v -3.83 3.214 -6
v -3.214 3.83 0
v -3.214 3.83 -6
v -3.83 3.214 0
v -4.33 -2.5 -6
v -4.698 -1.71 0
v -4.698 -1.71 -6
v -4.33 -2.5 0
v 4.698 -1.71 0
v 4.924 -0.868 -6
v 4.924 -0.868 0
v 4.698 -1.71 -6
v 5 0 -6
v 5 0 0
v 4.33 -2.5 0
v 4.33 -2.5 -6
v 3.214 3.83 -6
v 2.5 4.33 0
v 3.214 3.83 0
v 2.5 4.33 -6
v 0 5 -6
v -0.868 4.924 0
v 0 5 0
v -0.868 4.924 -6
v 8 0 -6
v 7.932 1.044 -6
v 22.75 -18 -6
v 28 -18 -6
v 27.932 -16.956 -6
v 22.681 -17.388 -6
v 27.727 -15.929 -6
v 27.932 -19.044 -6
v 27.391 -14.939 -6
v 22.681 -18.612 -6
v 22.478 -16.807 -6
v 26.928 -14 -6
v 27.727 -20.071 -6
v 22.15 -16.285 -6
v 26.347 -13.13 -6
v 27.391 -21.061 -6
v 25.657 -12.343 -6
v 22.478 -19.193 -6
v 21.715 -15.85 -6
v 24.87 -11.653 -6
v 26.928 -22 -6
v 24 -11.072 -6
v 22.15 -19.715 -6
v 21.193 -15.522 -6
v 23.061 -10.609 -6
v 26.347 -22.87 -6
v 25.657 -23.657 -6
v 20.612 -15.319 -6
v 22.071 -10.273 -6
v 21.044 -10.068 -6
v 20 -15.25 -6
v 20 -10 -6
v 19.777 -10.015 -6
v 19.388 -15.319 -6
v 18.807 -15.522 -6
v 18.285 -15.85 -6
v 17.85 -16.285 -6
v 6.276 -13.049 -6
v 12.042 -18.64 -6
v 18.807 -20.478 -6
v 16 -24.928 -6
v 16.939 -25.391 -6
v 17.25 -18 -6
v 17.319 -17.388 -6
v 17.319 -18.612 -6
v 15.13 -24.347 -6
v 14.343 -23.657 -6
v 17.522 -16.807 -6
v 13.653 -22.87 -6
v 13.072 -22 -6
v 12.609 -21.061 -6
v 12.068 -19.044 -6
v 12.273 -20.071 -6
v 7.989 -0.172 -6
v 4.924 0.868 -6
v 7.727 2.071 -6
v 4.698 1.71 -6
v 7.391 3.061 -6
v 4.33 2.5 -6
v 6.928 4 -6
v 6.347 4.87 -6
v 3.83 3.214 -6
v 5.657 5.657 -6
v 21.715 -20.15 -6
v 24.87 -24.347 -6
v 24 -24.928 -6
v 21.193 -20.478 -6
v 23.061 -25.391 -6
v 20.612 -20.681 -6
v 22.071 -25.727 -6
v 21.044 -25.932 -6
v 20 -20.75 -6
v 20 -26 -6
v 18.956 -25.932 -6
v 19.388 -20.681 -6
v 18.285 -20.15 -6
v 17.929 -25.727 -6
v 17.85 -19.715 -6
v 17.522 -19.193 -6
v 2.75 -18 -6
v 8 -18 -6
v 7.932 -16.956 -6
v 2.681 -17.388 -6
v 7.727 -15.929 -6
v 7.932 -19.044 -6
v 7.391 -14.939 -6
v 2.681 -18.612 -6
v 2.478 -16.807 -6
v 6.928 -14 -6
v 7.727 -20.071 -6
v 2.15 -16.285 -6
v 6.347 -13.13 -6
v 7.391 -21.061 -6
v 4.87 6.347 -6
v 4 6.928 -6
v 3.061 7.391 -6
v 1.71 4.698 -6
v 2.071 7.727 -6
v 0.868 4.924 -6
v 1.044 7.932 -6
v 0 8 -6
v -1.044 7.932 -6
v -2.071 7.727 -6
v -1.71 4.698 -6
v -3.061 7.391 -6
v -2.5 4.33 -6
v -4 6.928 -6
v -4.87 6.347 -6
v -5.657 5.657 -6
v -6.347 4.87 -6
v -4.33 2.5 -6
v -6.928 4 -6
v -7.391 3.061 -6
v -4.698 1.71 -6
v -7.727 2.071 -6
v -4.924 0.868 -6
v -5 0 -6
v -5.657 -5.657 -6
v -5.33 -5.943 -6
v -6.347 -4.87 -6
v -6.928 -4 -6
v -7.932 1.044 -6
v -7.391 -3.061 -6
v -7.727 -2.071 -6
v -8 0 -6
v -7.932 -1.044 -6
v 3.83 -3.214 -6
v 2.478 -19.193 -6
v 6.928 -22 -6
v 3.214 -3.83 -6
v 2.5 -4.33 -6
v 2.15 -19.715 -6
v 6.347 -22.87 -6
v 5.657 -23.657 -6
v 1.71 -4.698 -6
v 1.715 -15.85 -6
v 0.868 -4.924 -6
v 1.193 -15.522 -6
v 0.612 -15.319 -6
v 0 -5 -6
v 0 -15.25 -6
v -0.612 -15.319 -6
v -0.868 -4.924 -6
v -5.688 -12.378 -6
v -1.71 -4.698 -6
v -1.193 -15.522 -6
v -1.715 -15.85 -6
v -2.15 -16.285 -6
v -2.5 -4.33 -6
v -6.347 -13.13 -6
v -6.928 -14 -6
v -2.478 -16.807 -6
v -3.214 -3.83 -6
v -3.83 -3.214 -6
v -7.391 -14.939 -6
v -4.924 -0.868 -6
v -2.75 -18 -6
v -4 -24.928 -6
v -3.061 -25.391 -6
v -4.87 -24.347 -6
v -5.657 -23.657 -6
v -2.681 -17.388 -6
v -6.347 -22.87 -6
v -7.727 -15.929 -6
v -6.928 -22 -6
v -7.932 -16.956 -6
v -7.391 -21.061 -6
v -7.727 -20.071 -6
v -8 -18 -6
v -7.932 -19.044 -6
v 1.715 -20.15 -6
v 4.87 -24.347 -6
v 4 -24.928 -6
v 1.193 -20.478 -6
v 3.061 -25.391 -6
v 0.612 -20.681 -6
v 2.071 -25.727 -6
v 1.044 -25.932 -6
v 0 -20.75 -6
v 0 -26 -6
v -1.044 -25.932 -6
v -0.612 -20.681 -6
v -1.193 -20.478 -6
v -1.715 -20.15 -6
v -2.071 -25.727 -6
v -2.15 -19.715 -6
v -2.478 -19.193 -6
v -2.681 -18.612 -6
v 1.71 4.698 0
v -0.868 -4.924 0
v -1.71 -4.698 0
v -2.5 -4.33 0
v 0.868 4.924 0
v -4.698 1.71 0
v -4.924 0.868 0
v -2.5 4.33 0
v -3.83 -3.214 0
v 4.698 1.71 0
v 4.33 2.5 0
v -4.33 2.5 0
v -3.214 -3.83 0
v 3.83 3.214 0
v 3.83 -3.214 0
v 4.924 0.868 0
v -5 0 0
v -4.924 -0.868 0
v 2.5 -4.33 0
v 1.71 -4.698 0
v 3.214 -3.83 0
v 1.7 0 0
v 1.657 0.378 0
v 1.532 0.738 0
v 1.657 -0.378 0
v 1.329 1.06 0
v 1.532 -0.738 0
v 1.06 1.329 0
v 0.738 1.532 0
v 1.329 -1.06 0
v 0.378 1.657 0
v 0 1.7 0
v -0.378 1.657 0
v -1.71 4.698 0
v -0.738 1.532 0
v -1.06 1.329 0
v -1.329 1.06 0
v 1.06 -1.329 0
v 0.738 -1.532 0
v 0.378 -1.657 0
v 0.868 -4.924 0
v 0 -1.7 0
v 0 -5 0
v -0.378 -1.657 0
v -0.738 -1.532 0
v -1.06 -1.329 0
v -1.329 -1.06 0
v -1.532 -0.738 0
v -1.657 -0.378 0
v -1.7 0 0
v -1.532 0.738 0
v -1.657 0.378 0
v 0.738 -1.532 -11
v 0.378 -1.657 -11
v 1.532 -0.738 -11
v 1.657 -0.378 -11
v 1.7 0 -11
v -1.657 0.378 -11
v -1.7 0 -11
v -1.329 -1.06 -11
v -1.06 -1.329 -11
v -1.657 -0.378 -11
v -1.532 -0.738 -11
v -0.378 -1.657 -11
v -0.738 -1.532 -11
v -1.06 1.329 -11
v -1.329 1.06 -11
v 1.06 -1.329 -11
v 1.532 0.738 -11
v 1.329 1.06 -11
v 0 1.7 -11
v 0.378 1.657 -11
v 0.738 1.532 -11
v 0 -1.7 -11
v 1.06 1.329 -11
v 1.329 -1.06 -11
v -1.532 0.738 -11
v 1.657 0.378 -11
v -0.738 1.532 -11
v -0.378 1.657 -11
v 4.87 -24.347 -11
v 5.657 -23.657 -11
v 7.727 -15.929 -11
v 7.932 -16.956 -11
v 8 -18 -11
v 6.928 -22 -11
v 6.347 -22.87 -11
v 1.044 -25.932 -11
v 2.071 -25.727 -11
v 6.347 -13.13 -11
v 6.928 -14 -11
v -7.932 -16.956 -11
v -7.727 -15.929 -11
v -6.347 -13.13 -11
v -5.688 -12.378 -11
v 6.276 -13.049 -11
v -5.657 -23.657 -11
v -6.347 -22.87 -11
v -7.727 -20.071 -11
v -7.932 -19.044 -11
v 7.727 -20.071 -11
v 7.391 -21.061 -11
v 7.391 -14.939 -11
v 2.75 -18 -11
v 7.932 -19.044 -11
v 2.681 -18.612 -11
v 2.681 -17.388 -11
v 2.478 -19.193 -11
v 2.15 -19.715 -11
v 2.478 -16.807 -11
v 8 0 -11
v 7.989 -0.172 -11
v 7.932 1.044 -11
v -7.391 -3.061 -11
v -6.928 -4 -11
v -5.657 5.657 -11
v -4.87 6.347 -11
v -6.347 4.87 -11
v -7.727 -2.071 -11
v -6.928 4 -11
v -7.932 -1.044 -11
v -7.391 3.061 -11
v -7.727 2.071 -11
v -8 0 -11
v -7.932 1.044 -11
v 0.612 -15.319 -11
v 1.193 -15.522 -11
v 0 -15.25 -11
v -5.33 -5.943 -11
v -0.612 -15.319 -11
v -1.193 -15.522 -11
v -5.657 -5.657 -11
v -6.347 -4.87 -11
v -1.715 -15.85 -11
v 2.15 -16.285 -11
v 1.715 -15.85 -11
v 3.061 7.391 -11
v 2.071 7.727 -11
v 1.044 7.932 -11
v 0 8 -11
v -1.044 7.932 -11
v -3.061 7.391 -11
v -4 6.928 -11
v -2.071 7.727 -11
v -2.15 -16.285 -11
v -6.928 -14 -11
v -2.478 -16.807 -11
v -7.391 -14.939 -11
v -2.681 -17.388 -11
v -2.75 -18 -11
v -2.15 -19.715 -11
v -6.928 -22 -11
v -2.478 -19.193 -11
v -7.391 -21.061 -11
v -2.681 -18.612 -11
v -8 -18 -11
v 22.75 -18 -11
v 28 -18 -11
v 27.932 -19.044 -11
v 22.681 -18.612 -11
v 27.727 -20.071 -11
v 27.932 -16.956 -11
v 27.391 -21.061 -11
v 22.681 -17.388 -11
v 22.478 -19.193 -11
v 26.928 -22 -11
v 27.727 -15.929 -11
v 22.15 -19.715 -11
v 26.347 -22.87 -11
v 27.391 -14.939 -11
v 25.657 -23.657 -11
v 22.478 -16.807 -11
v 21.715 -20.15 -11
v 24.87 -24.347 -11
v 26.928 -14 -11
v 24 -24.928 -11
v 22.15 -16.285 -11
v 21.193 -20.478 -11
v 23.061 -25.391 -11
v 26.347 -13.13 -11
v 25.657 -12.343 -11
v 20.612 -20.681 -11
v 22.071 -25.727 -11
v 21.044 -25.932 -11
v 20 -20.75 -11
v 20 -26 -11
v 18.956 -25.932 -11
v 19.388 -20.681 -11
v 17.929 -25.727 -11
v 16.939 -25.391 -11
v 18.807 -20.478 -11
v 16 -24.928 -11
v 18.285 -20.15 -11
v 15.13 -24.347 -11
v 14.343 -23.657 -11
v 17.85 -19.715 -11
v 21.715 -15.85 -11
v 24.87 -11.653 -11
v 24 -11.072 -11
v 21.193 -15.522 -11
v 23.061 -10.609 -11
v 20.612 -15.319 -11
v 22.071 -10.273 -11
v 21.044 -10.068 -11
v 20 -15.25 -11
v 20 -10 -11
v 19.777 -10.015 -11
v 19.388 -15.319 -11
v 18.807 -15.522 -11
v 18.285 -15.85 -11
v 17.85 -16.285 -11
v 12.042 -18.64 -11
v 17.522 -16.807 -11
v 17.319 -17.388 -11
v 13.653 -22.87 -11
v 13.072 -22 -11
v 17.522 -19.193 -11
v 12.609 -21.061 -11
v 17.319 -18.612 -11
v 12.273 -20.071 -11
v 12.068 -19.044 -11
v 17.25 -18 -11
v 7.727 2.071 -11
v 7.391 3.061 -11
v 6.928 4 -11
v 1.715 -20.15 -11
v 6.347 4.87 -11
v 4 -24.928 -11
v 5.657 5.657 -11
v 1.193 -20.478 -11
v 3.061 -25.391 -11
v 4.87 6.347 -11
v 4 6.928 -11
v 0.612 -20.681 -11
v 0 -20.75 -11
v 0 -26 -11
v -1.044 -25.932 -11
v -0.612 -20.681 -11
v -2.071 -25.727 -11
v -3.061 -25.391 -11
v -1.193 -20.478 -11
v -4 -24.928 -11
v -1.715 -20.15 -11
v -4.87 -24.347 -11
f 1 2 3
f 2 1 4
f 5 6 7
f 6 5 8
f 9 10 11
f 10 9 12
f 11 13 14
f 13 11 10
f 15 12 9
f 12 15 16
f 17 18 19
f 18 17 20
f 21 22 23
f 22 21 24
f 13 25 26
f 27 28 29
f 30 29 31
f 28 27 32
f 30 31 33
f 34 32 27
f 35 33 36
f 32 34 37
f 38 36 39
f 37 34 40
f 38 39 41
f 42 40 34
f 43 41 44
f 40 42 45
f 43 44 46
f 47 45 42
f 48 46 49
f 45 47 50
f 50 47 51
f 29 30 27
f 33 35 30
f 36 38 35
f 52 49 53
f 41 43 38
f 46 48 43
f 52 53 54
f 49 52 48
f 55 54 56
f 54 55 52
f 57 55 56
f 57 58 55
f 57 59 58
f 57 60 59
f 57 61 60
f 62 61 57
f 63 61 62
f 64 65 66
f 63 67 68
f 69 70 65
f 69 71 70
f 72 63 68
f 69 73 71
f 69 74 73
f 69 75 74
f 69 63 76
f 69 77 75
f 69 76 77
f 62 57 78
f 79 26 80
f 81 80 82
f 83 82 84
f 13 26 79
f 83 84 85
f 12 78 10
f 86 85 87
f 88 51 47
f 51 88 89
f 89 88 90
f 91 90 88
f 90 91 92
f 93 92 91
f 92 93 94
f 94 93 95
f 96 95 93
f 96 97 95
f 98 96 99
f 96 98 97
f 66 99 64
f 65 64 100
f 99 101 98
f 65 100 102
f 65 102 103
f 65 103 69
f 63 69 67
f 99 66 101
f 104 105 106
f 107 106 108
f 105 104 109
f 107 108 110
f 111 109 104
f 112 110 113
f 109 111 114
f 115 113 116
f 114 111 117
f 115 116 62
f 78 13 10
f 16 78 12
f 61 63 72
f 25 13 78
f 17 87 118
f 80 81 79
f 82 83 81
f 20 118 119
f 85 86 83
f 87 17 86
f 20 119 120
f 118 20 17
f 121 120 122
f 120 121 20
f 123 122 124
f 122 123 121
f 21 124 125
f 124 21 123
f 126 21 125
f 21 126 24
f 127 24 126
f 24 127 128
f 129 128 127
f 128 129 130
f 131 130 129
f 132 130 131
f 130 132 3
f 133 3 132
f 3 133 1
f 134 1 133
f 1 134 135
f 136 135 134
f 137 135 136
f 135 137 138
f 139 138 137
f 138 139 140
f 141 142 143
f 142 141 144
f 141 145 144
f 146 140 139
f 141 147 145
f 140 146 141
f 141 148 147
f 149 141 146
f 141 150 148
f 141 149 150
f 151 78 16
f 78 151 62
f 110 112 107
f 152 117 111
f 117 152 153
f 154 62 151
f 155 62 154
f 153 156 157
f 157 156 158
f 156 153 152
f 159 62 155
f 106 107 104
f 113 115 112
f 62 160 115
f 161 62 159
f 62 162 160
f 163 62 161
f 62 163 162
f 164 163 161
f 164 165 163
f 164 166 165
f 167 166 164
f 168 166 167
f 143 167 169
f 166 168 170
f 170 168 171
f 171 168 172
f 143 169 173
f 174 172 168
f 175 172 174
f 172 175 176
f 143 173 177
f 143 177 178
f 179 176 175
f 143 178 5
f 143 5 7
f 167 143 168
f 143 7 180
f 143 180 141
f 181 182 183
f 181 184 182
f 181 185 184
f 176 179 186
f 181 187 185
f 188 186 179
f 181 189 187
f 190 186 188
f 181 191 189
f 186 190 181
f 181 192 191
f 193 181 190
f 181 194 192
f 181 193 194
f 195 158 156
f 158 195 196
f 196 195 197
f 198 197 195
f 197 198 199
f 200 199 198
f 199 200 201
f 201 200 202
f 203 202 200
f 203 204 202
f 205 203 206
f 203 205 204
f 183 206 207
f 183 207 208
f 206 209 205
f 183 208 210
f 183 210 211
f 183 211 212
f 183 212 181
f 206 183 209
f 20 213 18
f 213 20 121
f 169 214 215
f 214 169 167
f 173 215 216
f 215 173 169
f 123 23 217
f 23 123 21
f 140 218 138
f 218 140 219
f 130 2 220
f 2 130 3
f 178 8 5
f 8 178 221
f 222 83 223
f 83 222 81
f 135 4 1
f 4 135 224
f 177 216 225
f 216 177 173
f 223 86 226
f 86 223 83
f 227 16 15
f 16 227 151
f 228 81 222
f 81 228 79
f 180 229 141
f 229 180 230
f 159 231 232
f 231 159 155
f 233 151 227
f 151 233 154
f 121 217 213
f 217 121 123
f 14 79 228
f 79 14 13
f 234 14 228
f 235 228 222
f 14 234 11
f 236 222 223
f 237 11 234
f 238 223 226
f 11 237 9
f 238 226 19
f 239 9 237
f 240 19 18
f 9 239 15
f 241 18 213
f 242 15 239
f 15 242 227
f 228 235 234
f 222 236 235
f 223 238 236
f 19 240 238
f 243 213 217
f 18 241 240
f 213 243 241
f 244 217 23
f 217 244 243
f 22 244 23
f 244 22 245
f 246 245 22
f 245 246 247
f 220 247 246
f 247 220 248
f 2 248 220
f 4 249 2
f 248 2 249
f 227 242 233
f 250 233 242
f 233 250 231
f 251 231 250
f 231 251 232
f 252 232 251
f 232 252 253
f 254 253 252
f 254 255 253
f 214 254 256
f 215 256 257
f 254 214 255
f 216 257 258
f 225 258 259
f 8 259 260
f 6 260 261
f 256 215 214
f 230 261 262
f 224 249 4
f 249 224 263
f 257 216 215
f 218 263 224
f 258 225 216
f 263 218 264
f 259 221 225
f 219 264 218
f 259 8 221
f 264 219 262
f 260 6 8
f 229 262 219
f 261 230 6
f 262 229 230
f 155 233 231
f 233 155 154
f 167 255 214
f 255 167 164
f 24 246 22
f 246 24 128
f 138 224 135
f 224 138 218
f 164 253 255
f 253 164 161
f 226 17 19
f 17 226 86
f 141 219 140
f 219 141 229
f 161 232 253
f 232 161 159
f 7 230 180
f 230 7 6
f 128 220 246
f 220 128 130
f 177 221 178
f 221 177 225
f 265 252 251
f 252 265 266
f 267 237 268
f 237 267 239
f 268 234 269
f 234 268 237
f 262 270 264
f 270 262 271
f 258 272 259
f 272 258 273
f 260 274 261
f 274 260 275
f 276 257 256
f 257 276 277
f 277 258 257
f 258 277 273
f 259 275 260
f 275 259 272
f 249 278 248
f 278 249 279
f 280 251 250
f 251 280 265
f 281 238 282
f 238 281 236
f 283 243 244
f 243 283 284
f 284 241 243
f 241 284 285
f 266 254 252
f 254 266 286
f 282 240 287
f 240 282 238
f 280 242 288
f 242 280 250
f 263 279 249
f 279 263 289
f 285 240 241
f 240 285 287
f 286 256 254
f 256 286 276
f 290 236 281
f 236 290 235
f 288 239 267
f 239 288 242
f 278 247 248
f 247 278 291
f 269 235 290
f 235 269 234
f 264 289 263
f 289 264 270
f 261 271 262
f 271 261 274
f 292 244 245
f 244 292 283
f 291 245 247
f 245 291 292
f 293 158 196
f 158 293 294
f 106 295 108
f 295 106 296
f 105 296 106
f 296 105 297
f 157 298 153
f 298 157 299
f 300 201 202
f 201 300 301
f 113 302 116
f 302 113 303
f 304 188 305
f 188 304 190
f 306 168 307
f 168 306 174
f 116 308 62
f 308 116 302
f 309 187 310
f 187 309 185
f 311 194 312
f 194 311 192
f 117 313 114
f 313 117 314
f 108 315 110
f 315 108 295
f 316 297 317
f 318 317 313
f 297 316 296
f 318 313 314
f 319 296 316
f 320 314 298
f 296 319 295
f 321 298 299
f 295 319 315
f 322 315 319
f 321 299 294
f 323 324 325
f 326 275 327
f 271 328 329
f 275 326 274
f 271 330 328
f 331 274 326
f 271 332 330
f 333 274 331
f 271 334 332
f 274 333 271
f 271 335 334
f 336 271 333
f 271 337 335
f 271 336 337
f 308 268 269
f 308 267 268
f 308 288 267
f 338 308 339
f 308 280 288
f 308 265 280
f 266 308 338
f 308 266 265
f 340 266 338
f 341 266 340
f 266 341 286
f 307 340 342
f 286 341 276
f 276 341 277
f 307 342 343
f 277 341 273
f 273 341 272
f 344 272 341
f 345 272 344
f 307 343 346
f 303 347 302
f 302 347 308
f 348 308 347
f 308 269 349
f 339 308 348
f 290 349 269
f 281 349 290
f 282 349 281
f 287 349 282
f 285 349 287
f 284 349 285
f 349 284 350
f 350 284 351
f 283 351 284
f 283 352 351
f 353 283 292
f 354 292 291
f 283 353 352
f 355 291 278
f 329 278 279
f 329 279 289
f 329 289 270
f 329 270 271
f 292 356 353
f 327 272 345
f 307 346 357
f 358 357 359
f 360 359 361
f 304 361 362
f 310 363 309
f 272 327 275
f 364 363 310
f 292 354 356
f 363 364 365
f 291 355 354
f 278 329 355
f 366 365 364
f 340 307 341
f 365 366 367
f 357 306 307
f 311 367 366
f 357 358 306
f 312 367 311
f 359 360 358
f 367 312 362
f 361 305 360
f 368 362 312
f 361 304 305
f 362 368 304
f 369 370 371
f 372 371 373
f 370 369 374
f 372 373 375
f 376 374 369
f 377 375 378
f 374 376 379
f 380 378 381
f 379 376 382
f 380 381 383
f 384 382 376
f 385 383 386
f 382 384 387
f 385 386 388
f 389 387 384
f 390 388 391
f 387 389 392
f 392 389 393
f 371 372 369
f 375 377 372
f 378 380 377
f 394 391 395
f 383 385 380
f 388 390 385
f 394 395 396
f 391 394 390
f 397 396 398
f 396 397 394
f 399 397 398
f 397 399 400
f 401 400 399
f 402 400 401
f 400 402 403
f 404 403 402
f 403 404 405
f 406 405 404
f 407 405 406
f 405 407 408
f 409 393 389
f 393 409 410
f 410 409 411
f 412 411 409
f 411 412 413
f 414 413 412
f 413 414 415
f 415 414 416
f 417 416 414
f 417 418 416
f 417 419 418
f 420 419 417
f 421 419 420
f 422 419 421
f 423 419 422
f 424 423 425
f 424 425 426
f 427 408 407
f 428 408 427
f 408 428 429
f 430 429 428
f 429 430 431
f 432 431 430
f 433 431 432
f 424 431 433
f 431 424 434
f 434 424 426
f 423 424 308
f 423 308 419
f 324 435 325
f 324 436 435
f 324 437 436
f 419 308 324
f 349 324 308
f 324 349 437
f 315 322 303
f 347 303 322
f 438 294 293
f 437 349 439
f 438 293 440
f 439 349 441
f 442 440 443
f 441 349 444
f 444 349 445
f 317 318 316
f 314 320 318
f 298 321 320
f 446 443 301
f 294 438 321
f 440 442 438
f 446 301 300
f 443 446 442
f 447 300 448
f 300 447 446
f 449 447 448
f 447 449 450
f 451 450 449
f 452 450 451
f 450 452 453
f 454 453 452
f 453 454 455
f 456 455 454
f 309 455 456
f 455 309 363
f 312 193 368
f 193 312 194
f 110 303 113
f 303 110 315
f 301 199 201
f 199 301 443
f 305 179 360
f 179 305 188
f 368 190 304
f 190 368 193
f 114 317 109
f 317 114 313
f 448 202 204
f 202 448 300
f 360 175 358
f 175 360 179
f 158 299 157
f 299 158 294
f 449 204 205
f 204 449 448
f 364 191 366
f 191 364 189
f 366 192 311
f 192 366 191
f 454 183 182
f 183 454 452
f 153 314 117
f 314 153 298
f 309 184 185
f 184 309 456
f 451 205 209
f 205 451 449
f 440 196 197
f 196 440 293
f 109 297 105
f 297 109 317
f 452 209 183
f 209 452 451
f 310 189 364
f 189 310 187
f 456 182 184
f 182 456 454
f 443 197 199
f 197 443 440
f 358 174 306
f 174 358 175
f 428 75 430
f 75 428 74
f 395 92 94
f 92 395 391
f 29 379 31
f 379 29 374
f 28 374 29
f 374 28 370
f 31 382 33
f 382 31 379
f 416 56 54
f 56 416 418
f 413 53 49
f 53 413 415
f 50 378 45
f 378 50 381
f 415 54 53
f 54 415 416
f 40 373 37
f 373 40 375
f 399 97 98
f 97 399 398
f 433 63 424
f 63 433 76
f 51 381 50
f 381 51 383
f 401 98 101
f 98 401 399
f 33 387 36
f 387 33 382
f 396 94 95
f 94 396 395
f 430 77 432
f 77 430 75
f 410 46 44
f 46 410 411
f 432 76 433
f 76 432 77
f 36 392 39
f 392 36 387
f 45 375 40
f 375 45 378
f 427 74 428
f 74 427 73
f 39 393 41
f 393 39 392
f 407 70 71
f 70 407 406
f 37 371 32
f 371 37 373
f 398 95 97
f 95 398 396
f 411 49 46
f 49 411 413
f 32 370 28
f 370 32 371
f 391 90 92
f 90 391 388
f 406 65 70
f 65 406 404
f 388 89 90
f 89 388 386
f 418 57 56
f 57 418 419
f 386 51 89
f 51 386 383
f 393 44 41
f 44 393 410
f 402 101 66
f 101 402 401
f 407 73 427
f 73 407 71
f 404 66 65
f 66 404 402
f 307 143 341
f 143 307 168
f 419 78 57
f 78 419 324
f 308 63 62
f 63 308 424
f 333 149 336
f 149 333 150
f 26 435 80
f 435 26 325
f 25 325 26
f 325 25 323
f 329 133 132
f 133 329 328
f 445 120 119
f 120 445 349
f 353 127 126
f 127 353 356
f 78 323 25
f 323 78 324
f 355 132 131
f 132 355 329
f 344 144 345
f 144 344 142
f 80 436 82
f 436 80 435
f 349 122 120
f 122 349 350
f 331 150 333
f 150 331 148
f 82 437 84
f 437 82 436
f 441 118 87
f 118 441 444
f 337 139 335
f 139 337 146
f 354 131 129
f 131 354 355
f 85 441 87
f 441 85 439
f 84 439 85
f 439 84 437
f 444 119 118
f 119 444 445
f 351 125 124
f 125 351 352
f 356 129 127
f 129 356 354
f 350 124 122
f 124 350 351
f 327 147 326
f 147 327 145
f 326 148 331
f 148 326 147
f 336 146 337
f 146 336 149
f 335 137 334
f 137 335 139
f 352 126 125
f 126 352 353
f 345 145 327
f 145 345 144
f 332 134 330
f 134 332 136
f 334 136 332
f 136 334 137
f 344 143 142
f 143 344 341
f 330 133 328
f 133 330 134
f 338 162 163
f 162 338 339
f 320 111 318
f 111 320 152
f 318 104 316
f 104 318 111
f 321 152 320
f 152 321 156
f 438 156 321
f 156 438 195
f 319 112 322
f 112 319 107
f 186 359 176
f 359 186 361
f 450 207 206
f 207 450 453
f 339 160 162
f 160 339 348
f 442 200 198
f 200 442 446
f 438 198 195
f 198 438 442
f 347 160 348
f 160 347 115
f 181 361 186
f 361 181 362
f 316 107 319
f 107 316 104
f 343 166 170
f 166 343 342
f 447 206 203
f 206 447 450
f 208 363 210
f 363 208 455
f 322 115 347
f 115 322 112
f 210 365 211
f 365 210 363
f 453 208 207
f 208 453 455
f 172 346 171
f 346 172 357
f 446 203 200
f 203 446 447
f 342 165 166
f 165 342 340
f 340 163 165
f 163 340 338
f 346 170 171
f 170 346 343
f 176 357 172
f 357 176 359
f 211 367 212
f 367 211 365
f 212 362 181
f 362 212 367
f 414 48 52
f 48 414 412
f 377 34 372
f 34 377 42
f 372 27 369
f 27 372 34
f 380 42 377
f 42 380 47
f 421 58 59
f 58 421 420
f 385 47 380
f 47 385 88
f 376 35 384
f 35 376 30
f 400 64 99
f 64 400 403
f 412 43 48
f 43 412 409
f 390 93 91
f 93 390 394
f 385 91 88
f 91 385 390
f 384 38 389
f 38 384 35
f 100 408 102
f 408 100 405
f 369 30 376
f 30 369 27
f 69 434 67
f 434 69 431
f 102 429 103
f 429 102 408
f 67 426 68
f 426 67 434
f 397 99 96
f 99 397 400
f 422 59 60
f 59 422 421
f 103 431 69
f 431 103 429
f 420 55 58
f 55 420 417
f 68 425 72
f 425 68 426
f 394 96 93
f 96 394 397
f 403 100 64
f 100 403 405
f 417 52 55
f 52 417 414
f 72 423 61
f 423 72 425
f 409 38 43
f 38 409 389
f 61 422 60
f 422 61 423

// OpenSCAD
// HUB75 display case component: corner_bracket
include <../config/project_config.scad>

module corner_bracket_3d(is_top=false, right=false) {
    dz = is_top ? extrusion_offset : -extrusion_offset;
    dx_inwaarts = right ? -20 : 20;
    y_panel = 0;
    y_extrusion = panel_extrusion_y_offset;
    oor = 8;

    color(color_bracket)
    difference() {
        union() {
            // Rounded M3 lug in the same top plane as the M5 lugs.
            translate([0,y_extrusion+bracket_thickness,0])
                rotate([90,0,0])
                    cylinder(
                        h=bracket_thickness,
                        r=oor,
                        $fn=48
                    );

            // Spacer to the panel surface located 6 mm lower.
            translate([0,y_panel,0])
                rotate([-90,0,0])
                    difference() {
                        cylinder(h=y_extrusion,d=10,$fn=36);
                        translate([0,0,-0.1])
                            cylinder(
                                h=y_extrusion+0.2,
                                d=m3_hole_diameter,
                                $fn=28
                            );
                    }

            // Two rounded M5 lugs on the extrusion face.
            for(dx=[0,dx_inwaarts])
                translate([
                    dx,
                    y_extrusion+bracket_thickness,
                    dz
                ])
                    rotate([90,0,0])
                        cylinder(
                            h=bracket_thickness,
                            r=oor,
                            $fn=48
                        );

            // Smooth bridges in one flat top plane.
            for(dx=[0,dx_inwaarts])
                hull() {
                    translate([
                        0,
                        y_extrusion+bracket_thickness,
                        0
                    ])
                        rotate([90,0,0])
                            cylinder(
                                h=bracket_thickness,
                                r=5,
                                $fn=40
                            );

                    translate([
                        dx,
                        y_extrusion+bracket_thickness,
                        dz
                    ])
                        rotate([90,0,0])
                            cylinder(
                                h=bracket_thickness,
                                r=6,
                                $fn=40
                            );
                }
        }

        translate([0,y_panel-0.2,0])
            rotate([-90,0,0])
                cylinder(
                    h=y_extrusion+bracket_thickness+0.4,
                    d=m3_hole_diameter,
                    $fn=28
                );

        for(dx=[0,dx_inwaarts])
            translate([
                dx,
                y_extrusion-1,
                dz
            ])
                rotate([-90,0,0])
                    cylinder(
                        h=bracket_thickness+2,
                        d=m5_hole_diameter,
                        $fn=28
                    );
    }
}

/* [Standalone preview] */
preview_vertical = "bottom"; // [bottom,top]
preview_side = "left"; // [left,right]
rotate([-90,0,0]) corner_bracket_3d(preview_vertical == "top", preview_side == "right");
